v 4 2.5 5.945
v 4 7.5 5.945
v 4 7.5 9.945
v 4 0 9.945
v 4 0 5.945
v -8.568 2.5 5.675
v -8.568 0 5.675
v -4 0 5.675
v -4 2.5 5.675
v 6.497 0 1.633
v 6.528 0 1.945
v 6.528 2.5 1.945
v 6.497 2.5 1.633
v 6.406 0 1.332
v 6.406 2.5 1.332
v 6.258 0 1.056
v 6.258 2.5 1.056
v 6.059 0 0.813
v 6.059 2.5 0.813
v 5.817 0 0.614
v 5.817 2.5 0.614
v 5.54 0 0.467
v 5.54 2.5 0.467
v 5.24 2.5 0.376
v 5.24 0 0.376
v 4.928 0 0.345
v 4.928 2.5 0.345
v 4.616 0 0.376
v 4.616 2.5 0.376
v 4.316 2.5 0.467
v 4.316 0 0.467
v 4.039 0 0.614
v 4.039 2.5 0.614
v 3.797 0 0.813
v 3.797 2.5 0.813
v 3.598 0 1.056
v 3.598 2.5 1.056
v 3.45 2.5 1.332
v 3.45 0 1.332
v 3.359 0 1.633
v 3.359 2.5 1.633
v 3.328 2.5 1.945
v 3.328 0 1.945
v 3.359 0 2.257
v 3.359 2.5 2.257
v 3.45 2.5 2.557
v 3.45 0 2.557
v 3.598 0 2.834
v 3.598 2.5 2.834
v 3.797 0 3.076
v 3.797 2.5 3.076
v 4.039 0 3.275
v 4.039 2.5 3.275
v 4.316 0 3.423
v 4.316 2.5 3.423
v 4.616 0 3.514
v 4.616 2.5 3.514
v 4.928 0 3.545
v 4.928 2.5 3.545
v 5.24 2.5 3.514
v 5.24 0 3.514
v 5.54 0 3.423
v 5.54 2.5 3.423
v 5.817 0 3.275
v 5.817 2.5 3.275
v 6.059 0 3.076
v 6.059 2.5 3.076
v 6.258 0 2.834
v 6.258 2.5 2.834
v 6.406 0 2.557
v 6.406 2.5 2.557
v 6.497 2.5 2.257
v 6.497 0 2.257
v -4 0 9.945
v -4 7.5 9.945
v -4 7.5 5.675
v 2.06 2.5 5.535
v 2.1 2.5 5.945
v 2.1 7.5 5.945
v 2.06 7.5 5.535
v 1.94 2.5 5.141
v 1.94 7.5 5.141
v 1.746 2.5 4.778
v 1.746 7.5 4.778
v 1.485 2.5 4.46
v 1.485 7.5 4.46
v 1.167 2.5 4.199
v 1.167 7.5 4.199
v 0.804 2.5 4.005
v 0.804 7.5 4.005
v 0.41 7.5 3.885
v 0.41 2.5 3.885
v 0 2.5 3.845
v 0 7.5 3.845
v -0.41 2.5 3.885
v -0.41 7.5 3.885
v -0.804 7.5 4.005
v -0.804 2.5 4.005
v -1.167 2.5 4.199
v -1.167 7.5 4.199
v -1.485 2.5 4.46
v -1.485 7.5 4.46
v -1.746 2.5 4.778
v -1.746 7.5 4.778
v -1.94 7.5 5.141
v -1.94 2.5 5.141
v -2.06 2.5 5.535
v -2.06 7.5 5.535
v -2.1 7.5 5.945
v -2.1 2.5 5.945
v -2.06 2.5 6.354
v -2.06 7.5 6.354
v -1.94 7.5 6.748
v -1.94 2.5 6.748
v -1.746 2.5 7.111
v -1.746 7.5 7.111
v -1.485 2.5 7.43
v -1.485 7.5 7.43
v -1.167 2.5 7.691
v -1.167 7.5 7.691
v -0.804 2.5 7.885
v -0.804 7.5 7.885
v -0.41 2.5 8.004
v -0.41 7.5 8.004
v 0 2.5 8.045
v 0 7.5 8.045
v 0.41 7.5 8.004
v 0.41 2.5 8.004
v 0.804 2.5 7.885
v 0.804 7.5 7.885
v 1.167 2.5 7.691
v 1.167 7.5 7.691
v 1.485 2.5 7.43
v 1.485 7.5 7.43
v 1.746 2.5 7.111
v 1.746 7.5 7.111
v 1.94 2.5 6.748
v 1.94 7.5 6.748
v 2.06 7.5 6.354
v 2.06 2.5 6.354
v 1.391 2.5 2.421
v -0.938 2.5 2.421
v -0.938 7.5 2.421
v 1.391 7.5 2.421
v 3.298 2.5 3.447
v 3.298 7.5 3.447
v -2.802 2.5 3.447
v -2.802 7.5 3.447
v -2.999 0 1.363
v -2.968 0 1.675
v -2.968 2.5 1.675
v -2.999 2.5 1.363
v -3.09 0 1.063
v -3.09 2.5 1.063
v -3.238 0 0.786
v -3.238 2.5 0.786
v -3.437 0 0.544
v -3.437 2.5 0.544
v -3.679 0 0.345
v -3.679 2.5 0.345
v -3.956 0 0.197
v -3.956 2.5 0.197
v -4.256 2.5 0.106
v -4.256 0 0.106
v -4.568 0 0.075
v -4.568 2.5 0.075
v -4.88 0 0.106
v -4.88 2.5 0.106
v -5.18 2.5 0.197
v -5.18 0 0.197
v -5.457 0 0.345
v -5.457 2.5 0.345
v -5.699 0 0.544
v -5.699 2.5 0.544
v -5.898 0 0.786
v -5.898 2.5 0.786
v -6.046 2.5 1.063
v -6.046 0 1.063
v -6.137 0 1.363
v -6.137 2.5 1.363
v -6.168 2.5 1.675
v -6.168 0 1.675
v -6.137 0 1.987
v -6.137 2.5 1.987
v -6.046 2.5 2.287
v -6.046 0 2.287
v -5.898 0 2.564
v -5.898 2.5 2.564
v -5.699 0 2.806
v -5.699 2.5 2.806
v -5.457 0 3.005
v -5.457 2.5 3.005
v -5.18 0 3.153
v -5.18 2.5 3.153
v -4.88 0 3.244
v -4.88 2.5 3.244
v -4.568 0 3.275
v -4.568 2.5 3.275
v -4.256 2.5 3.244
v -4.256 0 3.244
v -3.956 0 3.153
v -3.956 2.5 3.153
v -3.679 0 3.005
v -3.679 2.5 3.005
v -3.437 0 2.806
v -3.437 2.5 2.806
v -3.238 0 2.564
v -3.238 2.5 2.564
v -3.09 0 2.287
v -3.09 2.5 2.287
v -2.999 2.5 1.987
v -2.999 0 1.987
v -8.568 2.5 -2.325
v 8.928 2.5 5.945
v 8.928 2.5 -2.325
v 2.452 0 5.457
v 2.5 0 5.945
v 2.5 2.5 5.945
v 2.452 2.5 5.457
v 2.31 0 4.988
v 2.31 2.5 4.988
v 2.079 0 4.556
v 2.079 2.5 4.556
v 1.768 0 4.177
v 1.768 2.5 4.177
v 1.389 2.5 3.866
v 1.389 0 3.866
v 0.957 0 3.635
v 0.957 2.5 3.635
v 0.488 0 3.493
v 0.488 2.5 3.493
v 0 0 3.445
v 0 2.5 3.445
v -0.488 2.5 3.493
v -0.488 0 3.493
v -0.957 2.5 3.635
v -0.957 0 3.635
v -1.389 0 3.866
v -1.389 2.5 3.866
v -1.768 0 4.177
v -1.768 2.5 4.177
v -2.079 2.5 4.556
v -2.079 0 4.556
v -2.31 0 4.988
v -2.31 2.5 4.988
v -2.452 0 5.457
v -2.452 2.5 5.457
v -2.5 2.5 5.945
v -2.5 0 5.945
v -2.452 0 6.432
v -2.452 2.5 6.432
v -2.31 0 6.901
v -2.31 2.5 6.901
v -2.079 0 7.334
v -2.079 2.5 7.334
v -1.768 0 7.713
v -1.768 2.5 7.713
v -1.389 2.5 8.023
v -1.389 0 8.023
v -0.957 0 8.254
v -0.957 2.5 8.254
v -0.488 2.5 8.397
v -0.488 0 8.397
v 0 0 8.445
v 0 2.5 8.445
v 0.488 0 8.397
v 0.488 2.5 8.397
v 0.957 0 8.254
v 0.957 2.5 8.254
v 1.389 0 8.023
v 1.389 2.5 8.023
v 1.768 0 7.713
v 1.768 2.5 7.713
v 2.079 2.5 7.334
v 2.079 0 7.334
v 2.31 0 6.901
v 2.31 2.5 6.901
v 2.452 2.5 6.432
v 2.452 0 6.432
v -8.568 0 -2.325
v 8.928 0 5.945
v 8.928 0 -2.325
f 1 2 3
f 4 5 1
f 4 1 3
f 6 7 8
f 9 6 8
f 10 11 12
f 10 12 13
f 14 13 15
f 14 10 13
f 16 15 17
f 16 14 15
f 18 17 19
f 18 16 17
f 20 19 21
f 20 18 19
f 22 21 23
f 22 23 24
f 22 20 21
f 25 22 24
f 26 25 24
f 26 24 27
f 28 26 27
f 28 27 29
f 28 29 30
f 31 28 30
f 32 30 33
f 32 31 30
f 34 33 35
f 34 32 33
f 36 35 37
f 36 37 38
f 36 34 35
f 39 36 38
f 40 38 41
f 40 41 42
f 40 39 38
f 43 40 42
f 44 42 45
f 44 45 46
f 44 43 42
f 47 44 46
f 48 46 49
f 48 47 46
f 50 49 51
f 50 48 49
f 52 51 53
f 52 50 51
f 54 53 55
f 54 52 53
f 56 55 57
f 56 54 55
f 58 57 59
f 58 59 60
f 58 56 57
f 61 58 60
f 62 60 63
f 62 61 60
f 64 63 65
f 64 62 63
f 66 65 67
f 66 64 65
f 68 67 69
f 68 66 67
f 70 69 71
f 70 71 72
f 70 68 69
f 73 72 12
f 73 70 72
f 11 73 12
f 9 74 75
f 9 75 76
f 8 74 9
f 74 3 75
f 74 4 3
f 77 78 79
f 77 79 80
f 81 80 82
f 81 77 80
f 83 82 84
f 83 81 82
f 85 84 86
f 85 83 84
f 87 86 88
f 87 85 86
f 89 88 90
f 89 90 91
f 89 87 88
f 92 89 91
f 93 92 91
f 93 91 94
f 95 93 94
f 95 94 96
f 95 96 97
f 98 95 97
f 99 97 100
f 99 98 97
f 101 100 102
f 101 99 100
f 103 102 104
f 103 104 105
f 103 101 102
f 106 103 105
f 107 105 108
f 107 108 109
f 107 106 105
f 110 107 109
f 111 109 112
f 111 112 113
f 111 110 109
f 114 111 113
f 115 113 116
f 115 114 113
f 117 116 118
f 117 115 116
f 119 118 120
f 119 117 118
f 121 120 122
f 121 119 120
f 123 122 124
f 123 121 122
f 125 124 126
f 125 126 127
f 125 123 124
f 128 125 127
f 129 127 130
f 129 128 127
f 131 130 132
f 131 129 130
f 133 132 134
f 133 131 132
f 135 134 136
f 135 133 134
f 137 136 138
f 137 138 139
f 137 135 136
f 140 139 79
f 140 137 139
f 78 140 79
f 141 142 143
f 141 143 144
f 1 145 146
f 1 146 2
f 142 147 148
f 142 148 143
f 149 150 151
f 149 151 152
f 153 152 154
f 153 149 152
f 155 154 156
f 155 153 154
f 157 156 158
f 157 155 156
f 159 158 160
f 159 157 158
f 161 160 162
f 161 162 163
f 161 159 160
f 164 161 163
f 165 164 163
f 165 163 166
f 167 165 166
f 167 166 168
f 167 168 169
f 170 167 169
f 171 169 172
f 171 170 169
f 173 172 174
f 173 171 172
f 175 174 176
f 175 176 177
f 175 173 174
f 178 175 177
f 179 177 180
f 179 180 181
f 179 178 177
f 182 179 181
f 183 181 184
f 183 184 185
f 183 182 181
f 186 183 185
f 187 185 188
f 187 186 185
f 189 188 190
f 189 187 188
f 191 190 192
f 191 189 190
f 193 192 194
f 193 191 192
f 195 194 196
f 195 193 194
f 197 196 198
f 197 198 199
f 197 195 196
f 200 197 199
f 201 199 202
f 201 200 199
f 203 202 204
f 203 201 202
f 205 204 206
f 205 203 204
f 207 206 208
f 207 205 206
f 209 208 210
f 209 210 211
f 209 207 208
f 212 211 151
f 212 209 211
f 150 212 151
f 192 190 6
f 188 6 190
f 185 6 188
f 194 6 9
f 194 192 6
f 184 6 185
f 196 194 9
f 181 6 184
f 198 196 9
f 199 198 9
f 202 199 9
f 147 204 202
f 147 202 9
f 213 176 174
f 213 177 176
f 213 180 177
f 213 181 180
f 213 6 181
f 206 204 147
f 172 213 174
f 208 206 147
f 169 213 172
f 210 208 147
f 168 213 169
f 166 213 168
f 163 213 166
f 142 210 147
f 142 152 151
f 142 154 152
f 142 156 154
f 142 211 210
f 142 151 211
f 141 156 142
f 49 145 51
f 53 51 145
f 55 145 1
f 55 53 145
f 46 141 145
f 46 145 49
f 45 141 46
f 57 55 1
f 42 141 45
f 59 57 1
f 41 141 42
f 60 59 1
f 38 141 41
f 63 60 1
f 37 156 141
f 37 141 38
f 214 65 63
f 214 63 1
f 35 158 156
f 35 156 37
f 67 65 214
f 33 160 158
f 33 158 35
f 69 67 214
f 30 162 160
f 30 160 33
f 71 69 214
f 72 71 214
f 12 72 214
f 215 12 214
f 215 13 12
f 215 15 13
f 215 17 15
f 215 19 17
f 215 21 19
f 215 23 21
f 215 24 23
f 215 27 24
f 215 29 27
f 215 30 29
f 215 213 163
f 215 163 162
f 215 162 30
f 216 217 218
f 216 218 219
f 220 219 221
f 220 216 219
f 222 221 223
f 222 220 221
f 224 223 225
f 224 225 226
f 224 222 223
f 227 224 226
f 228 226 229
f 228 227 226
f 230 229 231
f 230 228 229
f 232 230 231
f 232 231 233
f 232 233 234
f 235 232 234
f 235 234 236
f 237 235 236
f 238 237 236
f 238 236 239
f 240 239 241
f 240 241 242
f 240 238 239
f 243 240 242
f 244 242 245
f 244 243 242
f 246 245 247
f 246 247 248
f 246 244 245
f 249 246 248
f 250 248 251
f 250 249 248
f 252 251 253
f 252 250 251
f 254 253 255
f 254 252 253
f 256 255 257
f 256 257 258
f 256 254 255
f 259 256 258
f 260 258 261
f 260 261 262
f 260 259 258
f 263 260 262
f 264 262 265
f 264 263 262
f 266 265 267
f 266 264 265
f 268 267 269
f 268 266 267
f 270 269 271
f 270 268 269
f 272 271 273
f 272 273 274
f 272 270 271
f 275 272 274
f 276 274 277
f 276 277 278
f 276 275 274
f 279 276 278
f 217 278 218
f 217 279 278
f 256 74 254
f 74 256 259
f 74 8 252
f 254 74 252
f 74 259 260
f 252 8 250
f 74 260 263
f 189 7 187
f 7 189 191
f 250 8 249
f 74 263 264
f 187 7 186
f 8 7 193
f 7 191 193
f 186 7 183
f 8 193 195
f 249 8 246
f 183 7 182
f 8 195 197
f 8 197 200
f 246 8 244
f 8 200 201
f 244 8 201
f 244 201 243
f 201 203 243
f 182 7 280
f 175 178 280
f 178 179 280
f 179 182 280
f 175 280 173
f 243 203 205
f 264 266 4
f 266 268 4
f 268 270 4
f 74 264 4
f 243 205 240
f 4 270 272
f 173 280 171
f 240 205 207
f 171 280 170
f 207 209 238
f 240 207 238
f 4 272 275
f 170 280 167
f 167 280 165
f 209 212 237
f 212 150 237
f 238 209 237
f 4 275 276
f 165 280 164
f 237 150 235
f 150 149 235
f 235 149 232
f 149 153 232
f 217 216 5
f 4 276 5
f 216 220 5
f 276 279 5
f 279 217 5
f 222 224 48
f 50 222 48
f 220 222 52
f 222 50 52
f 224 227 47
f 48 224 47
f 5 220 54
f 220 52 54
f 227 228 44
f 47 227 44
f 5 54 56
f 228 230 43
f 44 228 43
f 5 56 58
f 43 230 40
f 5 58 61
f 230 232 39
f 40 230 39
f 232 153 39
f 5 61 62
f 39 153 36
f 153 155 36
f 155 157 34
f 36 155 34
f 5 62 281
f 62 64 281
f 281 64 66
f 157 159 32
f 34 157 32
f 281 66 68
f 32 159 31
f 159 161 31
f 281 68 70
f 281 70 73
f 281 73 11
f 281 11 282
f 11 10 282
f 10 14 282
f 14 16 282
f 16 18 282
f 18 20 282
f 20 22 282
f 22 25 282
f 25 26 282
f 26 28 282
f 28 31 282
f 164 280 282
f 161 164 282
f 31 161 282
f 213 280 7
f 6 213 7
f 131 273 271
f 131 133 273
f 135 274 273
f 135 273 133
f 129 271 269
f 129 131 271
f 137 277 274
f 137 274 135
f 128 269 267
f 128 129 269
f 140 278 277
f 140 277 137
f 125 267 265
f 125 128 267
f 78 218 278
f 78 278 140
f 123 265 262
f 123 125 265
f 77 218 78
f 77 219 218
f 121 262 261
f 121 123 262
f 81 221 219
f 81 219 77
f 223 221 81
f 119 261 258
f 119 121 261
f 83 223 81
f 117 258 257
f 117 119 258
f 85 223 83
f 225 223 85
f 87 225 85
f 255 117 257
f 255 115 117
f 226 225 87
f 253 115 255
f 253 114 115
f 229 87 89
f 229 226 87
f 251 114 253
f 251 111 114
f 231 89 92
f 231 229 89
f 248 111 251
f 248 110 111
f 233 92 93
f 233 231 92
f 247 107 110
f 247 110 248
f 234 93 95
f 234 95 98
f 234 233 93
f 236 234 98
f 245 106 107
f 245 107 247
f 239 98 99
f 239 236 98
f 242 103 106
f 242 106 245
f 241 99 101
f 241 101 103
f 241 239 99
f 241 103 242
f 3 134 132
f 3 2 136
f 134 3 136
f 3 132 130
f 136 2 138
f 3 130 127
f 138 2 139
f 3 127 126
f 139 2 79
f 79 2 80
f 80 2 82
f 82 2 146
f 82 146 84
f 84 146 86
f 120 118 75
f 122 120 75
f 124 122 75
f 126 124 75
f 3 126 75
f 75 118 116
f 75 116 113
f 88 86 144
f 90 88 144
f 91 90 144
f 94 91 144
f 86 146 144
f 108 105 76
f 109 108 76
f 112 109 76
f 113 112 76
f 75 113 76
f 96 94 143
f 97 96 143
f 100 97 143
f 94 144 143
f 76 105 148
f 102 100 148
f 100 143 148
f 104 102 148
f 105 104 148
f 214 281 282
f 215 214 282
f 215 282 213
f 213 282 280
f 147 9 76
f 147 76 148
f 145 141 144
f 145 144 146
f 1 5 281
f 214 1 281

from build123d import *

# Parameters (mm, degrees)
SKETCH1_R           = 1.6
SKETCH1_R_2         = 2.5
BOSS_EXTRUDE1_DEPTH = 2.5
SKETCH3_R           = 2.1
BOSS_EXTRUDE2_DEPTH = 5


with BuildPart() as part:
    # Sketch1 → Boss-Extrude1 (new body)
    with BuildSketch(Plane(origin=(0, 0, 0), x_dir=(1, 0, 0), z_dir=(0, 1, 0))):
        Polygon((-8.568054712, 2.324906367), (-8.568054712, -5.675093633), (-4, -5.675093633), (-4, -9.944756554), (4, -9.944756554), (4, -5.944756554), (8.928117249, -5.944756554), (8.928117249, 2.324906367), align=None)
        with Locations((-4.568054712, -1.675093633)):
            Circle(SKETCH1_R, mode=Mode.SUBTRACT)
        with Locations((4.928117249, -1.944756554)):
            Circle(SKETCH1_R, mode=Mode.SUBTRACT)
        with Locations((0, -5.944756554)):
            Circle(SKETCH1_R_2, mode=Mode.SUBTRACT)
    extrude(amount=BOSS_EXTRUDE1_DEPTH)

    # Sketch3 → Boss-Extrude2 (add)
    with BuildSketch(Plane(origin=(0, 2.5, 0), x_dir=(1, 0, 0), z_dir=(0, 1, 0))):
        Polygon((4, -9.944756554), (-4, -9.944756554), (-4, -5.675093633), (-2.801852171, -3.446508049), (-0.938175021, -2.421485617), (1.391421416, -2.421485617), (3.297989337, -3.446508049), (4, -5.944756554), align=None)
        with Locations((0, -5.944756554)):
            Circle(SKETCH3_R, mode=Mode.SUBTRACT)
    extrude(amount=BOSS_EXTRUDE2_DEPTH)


solid = part.part
